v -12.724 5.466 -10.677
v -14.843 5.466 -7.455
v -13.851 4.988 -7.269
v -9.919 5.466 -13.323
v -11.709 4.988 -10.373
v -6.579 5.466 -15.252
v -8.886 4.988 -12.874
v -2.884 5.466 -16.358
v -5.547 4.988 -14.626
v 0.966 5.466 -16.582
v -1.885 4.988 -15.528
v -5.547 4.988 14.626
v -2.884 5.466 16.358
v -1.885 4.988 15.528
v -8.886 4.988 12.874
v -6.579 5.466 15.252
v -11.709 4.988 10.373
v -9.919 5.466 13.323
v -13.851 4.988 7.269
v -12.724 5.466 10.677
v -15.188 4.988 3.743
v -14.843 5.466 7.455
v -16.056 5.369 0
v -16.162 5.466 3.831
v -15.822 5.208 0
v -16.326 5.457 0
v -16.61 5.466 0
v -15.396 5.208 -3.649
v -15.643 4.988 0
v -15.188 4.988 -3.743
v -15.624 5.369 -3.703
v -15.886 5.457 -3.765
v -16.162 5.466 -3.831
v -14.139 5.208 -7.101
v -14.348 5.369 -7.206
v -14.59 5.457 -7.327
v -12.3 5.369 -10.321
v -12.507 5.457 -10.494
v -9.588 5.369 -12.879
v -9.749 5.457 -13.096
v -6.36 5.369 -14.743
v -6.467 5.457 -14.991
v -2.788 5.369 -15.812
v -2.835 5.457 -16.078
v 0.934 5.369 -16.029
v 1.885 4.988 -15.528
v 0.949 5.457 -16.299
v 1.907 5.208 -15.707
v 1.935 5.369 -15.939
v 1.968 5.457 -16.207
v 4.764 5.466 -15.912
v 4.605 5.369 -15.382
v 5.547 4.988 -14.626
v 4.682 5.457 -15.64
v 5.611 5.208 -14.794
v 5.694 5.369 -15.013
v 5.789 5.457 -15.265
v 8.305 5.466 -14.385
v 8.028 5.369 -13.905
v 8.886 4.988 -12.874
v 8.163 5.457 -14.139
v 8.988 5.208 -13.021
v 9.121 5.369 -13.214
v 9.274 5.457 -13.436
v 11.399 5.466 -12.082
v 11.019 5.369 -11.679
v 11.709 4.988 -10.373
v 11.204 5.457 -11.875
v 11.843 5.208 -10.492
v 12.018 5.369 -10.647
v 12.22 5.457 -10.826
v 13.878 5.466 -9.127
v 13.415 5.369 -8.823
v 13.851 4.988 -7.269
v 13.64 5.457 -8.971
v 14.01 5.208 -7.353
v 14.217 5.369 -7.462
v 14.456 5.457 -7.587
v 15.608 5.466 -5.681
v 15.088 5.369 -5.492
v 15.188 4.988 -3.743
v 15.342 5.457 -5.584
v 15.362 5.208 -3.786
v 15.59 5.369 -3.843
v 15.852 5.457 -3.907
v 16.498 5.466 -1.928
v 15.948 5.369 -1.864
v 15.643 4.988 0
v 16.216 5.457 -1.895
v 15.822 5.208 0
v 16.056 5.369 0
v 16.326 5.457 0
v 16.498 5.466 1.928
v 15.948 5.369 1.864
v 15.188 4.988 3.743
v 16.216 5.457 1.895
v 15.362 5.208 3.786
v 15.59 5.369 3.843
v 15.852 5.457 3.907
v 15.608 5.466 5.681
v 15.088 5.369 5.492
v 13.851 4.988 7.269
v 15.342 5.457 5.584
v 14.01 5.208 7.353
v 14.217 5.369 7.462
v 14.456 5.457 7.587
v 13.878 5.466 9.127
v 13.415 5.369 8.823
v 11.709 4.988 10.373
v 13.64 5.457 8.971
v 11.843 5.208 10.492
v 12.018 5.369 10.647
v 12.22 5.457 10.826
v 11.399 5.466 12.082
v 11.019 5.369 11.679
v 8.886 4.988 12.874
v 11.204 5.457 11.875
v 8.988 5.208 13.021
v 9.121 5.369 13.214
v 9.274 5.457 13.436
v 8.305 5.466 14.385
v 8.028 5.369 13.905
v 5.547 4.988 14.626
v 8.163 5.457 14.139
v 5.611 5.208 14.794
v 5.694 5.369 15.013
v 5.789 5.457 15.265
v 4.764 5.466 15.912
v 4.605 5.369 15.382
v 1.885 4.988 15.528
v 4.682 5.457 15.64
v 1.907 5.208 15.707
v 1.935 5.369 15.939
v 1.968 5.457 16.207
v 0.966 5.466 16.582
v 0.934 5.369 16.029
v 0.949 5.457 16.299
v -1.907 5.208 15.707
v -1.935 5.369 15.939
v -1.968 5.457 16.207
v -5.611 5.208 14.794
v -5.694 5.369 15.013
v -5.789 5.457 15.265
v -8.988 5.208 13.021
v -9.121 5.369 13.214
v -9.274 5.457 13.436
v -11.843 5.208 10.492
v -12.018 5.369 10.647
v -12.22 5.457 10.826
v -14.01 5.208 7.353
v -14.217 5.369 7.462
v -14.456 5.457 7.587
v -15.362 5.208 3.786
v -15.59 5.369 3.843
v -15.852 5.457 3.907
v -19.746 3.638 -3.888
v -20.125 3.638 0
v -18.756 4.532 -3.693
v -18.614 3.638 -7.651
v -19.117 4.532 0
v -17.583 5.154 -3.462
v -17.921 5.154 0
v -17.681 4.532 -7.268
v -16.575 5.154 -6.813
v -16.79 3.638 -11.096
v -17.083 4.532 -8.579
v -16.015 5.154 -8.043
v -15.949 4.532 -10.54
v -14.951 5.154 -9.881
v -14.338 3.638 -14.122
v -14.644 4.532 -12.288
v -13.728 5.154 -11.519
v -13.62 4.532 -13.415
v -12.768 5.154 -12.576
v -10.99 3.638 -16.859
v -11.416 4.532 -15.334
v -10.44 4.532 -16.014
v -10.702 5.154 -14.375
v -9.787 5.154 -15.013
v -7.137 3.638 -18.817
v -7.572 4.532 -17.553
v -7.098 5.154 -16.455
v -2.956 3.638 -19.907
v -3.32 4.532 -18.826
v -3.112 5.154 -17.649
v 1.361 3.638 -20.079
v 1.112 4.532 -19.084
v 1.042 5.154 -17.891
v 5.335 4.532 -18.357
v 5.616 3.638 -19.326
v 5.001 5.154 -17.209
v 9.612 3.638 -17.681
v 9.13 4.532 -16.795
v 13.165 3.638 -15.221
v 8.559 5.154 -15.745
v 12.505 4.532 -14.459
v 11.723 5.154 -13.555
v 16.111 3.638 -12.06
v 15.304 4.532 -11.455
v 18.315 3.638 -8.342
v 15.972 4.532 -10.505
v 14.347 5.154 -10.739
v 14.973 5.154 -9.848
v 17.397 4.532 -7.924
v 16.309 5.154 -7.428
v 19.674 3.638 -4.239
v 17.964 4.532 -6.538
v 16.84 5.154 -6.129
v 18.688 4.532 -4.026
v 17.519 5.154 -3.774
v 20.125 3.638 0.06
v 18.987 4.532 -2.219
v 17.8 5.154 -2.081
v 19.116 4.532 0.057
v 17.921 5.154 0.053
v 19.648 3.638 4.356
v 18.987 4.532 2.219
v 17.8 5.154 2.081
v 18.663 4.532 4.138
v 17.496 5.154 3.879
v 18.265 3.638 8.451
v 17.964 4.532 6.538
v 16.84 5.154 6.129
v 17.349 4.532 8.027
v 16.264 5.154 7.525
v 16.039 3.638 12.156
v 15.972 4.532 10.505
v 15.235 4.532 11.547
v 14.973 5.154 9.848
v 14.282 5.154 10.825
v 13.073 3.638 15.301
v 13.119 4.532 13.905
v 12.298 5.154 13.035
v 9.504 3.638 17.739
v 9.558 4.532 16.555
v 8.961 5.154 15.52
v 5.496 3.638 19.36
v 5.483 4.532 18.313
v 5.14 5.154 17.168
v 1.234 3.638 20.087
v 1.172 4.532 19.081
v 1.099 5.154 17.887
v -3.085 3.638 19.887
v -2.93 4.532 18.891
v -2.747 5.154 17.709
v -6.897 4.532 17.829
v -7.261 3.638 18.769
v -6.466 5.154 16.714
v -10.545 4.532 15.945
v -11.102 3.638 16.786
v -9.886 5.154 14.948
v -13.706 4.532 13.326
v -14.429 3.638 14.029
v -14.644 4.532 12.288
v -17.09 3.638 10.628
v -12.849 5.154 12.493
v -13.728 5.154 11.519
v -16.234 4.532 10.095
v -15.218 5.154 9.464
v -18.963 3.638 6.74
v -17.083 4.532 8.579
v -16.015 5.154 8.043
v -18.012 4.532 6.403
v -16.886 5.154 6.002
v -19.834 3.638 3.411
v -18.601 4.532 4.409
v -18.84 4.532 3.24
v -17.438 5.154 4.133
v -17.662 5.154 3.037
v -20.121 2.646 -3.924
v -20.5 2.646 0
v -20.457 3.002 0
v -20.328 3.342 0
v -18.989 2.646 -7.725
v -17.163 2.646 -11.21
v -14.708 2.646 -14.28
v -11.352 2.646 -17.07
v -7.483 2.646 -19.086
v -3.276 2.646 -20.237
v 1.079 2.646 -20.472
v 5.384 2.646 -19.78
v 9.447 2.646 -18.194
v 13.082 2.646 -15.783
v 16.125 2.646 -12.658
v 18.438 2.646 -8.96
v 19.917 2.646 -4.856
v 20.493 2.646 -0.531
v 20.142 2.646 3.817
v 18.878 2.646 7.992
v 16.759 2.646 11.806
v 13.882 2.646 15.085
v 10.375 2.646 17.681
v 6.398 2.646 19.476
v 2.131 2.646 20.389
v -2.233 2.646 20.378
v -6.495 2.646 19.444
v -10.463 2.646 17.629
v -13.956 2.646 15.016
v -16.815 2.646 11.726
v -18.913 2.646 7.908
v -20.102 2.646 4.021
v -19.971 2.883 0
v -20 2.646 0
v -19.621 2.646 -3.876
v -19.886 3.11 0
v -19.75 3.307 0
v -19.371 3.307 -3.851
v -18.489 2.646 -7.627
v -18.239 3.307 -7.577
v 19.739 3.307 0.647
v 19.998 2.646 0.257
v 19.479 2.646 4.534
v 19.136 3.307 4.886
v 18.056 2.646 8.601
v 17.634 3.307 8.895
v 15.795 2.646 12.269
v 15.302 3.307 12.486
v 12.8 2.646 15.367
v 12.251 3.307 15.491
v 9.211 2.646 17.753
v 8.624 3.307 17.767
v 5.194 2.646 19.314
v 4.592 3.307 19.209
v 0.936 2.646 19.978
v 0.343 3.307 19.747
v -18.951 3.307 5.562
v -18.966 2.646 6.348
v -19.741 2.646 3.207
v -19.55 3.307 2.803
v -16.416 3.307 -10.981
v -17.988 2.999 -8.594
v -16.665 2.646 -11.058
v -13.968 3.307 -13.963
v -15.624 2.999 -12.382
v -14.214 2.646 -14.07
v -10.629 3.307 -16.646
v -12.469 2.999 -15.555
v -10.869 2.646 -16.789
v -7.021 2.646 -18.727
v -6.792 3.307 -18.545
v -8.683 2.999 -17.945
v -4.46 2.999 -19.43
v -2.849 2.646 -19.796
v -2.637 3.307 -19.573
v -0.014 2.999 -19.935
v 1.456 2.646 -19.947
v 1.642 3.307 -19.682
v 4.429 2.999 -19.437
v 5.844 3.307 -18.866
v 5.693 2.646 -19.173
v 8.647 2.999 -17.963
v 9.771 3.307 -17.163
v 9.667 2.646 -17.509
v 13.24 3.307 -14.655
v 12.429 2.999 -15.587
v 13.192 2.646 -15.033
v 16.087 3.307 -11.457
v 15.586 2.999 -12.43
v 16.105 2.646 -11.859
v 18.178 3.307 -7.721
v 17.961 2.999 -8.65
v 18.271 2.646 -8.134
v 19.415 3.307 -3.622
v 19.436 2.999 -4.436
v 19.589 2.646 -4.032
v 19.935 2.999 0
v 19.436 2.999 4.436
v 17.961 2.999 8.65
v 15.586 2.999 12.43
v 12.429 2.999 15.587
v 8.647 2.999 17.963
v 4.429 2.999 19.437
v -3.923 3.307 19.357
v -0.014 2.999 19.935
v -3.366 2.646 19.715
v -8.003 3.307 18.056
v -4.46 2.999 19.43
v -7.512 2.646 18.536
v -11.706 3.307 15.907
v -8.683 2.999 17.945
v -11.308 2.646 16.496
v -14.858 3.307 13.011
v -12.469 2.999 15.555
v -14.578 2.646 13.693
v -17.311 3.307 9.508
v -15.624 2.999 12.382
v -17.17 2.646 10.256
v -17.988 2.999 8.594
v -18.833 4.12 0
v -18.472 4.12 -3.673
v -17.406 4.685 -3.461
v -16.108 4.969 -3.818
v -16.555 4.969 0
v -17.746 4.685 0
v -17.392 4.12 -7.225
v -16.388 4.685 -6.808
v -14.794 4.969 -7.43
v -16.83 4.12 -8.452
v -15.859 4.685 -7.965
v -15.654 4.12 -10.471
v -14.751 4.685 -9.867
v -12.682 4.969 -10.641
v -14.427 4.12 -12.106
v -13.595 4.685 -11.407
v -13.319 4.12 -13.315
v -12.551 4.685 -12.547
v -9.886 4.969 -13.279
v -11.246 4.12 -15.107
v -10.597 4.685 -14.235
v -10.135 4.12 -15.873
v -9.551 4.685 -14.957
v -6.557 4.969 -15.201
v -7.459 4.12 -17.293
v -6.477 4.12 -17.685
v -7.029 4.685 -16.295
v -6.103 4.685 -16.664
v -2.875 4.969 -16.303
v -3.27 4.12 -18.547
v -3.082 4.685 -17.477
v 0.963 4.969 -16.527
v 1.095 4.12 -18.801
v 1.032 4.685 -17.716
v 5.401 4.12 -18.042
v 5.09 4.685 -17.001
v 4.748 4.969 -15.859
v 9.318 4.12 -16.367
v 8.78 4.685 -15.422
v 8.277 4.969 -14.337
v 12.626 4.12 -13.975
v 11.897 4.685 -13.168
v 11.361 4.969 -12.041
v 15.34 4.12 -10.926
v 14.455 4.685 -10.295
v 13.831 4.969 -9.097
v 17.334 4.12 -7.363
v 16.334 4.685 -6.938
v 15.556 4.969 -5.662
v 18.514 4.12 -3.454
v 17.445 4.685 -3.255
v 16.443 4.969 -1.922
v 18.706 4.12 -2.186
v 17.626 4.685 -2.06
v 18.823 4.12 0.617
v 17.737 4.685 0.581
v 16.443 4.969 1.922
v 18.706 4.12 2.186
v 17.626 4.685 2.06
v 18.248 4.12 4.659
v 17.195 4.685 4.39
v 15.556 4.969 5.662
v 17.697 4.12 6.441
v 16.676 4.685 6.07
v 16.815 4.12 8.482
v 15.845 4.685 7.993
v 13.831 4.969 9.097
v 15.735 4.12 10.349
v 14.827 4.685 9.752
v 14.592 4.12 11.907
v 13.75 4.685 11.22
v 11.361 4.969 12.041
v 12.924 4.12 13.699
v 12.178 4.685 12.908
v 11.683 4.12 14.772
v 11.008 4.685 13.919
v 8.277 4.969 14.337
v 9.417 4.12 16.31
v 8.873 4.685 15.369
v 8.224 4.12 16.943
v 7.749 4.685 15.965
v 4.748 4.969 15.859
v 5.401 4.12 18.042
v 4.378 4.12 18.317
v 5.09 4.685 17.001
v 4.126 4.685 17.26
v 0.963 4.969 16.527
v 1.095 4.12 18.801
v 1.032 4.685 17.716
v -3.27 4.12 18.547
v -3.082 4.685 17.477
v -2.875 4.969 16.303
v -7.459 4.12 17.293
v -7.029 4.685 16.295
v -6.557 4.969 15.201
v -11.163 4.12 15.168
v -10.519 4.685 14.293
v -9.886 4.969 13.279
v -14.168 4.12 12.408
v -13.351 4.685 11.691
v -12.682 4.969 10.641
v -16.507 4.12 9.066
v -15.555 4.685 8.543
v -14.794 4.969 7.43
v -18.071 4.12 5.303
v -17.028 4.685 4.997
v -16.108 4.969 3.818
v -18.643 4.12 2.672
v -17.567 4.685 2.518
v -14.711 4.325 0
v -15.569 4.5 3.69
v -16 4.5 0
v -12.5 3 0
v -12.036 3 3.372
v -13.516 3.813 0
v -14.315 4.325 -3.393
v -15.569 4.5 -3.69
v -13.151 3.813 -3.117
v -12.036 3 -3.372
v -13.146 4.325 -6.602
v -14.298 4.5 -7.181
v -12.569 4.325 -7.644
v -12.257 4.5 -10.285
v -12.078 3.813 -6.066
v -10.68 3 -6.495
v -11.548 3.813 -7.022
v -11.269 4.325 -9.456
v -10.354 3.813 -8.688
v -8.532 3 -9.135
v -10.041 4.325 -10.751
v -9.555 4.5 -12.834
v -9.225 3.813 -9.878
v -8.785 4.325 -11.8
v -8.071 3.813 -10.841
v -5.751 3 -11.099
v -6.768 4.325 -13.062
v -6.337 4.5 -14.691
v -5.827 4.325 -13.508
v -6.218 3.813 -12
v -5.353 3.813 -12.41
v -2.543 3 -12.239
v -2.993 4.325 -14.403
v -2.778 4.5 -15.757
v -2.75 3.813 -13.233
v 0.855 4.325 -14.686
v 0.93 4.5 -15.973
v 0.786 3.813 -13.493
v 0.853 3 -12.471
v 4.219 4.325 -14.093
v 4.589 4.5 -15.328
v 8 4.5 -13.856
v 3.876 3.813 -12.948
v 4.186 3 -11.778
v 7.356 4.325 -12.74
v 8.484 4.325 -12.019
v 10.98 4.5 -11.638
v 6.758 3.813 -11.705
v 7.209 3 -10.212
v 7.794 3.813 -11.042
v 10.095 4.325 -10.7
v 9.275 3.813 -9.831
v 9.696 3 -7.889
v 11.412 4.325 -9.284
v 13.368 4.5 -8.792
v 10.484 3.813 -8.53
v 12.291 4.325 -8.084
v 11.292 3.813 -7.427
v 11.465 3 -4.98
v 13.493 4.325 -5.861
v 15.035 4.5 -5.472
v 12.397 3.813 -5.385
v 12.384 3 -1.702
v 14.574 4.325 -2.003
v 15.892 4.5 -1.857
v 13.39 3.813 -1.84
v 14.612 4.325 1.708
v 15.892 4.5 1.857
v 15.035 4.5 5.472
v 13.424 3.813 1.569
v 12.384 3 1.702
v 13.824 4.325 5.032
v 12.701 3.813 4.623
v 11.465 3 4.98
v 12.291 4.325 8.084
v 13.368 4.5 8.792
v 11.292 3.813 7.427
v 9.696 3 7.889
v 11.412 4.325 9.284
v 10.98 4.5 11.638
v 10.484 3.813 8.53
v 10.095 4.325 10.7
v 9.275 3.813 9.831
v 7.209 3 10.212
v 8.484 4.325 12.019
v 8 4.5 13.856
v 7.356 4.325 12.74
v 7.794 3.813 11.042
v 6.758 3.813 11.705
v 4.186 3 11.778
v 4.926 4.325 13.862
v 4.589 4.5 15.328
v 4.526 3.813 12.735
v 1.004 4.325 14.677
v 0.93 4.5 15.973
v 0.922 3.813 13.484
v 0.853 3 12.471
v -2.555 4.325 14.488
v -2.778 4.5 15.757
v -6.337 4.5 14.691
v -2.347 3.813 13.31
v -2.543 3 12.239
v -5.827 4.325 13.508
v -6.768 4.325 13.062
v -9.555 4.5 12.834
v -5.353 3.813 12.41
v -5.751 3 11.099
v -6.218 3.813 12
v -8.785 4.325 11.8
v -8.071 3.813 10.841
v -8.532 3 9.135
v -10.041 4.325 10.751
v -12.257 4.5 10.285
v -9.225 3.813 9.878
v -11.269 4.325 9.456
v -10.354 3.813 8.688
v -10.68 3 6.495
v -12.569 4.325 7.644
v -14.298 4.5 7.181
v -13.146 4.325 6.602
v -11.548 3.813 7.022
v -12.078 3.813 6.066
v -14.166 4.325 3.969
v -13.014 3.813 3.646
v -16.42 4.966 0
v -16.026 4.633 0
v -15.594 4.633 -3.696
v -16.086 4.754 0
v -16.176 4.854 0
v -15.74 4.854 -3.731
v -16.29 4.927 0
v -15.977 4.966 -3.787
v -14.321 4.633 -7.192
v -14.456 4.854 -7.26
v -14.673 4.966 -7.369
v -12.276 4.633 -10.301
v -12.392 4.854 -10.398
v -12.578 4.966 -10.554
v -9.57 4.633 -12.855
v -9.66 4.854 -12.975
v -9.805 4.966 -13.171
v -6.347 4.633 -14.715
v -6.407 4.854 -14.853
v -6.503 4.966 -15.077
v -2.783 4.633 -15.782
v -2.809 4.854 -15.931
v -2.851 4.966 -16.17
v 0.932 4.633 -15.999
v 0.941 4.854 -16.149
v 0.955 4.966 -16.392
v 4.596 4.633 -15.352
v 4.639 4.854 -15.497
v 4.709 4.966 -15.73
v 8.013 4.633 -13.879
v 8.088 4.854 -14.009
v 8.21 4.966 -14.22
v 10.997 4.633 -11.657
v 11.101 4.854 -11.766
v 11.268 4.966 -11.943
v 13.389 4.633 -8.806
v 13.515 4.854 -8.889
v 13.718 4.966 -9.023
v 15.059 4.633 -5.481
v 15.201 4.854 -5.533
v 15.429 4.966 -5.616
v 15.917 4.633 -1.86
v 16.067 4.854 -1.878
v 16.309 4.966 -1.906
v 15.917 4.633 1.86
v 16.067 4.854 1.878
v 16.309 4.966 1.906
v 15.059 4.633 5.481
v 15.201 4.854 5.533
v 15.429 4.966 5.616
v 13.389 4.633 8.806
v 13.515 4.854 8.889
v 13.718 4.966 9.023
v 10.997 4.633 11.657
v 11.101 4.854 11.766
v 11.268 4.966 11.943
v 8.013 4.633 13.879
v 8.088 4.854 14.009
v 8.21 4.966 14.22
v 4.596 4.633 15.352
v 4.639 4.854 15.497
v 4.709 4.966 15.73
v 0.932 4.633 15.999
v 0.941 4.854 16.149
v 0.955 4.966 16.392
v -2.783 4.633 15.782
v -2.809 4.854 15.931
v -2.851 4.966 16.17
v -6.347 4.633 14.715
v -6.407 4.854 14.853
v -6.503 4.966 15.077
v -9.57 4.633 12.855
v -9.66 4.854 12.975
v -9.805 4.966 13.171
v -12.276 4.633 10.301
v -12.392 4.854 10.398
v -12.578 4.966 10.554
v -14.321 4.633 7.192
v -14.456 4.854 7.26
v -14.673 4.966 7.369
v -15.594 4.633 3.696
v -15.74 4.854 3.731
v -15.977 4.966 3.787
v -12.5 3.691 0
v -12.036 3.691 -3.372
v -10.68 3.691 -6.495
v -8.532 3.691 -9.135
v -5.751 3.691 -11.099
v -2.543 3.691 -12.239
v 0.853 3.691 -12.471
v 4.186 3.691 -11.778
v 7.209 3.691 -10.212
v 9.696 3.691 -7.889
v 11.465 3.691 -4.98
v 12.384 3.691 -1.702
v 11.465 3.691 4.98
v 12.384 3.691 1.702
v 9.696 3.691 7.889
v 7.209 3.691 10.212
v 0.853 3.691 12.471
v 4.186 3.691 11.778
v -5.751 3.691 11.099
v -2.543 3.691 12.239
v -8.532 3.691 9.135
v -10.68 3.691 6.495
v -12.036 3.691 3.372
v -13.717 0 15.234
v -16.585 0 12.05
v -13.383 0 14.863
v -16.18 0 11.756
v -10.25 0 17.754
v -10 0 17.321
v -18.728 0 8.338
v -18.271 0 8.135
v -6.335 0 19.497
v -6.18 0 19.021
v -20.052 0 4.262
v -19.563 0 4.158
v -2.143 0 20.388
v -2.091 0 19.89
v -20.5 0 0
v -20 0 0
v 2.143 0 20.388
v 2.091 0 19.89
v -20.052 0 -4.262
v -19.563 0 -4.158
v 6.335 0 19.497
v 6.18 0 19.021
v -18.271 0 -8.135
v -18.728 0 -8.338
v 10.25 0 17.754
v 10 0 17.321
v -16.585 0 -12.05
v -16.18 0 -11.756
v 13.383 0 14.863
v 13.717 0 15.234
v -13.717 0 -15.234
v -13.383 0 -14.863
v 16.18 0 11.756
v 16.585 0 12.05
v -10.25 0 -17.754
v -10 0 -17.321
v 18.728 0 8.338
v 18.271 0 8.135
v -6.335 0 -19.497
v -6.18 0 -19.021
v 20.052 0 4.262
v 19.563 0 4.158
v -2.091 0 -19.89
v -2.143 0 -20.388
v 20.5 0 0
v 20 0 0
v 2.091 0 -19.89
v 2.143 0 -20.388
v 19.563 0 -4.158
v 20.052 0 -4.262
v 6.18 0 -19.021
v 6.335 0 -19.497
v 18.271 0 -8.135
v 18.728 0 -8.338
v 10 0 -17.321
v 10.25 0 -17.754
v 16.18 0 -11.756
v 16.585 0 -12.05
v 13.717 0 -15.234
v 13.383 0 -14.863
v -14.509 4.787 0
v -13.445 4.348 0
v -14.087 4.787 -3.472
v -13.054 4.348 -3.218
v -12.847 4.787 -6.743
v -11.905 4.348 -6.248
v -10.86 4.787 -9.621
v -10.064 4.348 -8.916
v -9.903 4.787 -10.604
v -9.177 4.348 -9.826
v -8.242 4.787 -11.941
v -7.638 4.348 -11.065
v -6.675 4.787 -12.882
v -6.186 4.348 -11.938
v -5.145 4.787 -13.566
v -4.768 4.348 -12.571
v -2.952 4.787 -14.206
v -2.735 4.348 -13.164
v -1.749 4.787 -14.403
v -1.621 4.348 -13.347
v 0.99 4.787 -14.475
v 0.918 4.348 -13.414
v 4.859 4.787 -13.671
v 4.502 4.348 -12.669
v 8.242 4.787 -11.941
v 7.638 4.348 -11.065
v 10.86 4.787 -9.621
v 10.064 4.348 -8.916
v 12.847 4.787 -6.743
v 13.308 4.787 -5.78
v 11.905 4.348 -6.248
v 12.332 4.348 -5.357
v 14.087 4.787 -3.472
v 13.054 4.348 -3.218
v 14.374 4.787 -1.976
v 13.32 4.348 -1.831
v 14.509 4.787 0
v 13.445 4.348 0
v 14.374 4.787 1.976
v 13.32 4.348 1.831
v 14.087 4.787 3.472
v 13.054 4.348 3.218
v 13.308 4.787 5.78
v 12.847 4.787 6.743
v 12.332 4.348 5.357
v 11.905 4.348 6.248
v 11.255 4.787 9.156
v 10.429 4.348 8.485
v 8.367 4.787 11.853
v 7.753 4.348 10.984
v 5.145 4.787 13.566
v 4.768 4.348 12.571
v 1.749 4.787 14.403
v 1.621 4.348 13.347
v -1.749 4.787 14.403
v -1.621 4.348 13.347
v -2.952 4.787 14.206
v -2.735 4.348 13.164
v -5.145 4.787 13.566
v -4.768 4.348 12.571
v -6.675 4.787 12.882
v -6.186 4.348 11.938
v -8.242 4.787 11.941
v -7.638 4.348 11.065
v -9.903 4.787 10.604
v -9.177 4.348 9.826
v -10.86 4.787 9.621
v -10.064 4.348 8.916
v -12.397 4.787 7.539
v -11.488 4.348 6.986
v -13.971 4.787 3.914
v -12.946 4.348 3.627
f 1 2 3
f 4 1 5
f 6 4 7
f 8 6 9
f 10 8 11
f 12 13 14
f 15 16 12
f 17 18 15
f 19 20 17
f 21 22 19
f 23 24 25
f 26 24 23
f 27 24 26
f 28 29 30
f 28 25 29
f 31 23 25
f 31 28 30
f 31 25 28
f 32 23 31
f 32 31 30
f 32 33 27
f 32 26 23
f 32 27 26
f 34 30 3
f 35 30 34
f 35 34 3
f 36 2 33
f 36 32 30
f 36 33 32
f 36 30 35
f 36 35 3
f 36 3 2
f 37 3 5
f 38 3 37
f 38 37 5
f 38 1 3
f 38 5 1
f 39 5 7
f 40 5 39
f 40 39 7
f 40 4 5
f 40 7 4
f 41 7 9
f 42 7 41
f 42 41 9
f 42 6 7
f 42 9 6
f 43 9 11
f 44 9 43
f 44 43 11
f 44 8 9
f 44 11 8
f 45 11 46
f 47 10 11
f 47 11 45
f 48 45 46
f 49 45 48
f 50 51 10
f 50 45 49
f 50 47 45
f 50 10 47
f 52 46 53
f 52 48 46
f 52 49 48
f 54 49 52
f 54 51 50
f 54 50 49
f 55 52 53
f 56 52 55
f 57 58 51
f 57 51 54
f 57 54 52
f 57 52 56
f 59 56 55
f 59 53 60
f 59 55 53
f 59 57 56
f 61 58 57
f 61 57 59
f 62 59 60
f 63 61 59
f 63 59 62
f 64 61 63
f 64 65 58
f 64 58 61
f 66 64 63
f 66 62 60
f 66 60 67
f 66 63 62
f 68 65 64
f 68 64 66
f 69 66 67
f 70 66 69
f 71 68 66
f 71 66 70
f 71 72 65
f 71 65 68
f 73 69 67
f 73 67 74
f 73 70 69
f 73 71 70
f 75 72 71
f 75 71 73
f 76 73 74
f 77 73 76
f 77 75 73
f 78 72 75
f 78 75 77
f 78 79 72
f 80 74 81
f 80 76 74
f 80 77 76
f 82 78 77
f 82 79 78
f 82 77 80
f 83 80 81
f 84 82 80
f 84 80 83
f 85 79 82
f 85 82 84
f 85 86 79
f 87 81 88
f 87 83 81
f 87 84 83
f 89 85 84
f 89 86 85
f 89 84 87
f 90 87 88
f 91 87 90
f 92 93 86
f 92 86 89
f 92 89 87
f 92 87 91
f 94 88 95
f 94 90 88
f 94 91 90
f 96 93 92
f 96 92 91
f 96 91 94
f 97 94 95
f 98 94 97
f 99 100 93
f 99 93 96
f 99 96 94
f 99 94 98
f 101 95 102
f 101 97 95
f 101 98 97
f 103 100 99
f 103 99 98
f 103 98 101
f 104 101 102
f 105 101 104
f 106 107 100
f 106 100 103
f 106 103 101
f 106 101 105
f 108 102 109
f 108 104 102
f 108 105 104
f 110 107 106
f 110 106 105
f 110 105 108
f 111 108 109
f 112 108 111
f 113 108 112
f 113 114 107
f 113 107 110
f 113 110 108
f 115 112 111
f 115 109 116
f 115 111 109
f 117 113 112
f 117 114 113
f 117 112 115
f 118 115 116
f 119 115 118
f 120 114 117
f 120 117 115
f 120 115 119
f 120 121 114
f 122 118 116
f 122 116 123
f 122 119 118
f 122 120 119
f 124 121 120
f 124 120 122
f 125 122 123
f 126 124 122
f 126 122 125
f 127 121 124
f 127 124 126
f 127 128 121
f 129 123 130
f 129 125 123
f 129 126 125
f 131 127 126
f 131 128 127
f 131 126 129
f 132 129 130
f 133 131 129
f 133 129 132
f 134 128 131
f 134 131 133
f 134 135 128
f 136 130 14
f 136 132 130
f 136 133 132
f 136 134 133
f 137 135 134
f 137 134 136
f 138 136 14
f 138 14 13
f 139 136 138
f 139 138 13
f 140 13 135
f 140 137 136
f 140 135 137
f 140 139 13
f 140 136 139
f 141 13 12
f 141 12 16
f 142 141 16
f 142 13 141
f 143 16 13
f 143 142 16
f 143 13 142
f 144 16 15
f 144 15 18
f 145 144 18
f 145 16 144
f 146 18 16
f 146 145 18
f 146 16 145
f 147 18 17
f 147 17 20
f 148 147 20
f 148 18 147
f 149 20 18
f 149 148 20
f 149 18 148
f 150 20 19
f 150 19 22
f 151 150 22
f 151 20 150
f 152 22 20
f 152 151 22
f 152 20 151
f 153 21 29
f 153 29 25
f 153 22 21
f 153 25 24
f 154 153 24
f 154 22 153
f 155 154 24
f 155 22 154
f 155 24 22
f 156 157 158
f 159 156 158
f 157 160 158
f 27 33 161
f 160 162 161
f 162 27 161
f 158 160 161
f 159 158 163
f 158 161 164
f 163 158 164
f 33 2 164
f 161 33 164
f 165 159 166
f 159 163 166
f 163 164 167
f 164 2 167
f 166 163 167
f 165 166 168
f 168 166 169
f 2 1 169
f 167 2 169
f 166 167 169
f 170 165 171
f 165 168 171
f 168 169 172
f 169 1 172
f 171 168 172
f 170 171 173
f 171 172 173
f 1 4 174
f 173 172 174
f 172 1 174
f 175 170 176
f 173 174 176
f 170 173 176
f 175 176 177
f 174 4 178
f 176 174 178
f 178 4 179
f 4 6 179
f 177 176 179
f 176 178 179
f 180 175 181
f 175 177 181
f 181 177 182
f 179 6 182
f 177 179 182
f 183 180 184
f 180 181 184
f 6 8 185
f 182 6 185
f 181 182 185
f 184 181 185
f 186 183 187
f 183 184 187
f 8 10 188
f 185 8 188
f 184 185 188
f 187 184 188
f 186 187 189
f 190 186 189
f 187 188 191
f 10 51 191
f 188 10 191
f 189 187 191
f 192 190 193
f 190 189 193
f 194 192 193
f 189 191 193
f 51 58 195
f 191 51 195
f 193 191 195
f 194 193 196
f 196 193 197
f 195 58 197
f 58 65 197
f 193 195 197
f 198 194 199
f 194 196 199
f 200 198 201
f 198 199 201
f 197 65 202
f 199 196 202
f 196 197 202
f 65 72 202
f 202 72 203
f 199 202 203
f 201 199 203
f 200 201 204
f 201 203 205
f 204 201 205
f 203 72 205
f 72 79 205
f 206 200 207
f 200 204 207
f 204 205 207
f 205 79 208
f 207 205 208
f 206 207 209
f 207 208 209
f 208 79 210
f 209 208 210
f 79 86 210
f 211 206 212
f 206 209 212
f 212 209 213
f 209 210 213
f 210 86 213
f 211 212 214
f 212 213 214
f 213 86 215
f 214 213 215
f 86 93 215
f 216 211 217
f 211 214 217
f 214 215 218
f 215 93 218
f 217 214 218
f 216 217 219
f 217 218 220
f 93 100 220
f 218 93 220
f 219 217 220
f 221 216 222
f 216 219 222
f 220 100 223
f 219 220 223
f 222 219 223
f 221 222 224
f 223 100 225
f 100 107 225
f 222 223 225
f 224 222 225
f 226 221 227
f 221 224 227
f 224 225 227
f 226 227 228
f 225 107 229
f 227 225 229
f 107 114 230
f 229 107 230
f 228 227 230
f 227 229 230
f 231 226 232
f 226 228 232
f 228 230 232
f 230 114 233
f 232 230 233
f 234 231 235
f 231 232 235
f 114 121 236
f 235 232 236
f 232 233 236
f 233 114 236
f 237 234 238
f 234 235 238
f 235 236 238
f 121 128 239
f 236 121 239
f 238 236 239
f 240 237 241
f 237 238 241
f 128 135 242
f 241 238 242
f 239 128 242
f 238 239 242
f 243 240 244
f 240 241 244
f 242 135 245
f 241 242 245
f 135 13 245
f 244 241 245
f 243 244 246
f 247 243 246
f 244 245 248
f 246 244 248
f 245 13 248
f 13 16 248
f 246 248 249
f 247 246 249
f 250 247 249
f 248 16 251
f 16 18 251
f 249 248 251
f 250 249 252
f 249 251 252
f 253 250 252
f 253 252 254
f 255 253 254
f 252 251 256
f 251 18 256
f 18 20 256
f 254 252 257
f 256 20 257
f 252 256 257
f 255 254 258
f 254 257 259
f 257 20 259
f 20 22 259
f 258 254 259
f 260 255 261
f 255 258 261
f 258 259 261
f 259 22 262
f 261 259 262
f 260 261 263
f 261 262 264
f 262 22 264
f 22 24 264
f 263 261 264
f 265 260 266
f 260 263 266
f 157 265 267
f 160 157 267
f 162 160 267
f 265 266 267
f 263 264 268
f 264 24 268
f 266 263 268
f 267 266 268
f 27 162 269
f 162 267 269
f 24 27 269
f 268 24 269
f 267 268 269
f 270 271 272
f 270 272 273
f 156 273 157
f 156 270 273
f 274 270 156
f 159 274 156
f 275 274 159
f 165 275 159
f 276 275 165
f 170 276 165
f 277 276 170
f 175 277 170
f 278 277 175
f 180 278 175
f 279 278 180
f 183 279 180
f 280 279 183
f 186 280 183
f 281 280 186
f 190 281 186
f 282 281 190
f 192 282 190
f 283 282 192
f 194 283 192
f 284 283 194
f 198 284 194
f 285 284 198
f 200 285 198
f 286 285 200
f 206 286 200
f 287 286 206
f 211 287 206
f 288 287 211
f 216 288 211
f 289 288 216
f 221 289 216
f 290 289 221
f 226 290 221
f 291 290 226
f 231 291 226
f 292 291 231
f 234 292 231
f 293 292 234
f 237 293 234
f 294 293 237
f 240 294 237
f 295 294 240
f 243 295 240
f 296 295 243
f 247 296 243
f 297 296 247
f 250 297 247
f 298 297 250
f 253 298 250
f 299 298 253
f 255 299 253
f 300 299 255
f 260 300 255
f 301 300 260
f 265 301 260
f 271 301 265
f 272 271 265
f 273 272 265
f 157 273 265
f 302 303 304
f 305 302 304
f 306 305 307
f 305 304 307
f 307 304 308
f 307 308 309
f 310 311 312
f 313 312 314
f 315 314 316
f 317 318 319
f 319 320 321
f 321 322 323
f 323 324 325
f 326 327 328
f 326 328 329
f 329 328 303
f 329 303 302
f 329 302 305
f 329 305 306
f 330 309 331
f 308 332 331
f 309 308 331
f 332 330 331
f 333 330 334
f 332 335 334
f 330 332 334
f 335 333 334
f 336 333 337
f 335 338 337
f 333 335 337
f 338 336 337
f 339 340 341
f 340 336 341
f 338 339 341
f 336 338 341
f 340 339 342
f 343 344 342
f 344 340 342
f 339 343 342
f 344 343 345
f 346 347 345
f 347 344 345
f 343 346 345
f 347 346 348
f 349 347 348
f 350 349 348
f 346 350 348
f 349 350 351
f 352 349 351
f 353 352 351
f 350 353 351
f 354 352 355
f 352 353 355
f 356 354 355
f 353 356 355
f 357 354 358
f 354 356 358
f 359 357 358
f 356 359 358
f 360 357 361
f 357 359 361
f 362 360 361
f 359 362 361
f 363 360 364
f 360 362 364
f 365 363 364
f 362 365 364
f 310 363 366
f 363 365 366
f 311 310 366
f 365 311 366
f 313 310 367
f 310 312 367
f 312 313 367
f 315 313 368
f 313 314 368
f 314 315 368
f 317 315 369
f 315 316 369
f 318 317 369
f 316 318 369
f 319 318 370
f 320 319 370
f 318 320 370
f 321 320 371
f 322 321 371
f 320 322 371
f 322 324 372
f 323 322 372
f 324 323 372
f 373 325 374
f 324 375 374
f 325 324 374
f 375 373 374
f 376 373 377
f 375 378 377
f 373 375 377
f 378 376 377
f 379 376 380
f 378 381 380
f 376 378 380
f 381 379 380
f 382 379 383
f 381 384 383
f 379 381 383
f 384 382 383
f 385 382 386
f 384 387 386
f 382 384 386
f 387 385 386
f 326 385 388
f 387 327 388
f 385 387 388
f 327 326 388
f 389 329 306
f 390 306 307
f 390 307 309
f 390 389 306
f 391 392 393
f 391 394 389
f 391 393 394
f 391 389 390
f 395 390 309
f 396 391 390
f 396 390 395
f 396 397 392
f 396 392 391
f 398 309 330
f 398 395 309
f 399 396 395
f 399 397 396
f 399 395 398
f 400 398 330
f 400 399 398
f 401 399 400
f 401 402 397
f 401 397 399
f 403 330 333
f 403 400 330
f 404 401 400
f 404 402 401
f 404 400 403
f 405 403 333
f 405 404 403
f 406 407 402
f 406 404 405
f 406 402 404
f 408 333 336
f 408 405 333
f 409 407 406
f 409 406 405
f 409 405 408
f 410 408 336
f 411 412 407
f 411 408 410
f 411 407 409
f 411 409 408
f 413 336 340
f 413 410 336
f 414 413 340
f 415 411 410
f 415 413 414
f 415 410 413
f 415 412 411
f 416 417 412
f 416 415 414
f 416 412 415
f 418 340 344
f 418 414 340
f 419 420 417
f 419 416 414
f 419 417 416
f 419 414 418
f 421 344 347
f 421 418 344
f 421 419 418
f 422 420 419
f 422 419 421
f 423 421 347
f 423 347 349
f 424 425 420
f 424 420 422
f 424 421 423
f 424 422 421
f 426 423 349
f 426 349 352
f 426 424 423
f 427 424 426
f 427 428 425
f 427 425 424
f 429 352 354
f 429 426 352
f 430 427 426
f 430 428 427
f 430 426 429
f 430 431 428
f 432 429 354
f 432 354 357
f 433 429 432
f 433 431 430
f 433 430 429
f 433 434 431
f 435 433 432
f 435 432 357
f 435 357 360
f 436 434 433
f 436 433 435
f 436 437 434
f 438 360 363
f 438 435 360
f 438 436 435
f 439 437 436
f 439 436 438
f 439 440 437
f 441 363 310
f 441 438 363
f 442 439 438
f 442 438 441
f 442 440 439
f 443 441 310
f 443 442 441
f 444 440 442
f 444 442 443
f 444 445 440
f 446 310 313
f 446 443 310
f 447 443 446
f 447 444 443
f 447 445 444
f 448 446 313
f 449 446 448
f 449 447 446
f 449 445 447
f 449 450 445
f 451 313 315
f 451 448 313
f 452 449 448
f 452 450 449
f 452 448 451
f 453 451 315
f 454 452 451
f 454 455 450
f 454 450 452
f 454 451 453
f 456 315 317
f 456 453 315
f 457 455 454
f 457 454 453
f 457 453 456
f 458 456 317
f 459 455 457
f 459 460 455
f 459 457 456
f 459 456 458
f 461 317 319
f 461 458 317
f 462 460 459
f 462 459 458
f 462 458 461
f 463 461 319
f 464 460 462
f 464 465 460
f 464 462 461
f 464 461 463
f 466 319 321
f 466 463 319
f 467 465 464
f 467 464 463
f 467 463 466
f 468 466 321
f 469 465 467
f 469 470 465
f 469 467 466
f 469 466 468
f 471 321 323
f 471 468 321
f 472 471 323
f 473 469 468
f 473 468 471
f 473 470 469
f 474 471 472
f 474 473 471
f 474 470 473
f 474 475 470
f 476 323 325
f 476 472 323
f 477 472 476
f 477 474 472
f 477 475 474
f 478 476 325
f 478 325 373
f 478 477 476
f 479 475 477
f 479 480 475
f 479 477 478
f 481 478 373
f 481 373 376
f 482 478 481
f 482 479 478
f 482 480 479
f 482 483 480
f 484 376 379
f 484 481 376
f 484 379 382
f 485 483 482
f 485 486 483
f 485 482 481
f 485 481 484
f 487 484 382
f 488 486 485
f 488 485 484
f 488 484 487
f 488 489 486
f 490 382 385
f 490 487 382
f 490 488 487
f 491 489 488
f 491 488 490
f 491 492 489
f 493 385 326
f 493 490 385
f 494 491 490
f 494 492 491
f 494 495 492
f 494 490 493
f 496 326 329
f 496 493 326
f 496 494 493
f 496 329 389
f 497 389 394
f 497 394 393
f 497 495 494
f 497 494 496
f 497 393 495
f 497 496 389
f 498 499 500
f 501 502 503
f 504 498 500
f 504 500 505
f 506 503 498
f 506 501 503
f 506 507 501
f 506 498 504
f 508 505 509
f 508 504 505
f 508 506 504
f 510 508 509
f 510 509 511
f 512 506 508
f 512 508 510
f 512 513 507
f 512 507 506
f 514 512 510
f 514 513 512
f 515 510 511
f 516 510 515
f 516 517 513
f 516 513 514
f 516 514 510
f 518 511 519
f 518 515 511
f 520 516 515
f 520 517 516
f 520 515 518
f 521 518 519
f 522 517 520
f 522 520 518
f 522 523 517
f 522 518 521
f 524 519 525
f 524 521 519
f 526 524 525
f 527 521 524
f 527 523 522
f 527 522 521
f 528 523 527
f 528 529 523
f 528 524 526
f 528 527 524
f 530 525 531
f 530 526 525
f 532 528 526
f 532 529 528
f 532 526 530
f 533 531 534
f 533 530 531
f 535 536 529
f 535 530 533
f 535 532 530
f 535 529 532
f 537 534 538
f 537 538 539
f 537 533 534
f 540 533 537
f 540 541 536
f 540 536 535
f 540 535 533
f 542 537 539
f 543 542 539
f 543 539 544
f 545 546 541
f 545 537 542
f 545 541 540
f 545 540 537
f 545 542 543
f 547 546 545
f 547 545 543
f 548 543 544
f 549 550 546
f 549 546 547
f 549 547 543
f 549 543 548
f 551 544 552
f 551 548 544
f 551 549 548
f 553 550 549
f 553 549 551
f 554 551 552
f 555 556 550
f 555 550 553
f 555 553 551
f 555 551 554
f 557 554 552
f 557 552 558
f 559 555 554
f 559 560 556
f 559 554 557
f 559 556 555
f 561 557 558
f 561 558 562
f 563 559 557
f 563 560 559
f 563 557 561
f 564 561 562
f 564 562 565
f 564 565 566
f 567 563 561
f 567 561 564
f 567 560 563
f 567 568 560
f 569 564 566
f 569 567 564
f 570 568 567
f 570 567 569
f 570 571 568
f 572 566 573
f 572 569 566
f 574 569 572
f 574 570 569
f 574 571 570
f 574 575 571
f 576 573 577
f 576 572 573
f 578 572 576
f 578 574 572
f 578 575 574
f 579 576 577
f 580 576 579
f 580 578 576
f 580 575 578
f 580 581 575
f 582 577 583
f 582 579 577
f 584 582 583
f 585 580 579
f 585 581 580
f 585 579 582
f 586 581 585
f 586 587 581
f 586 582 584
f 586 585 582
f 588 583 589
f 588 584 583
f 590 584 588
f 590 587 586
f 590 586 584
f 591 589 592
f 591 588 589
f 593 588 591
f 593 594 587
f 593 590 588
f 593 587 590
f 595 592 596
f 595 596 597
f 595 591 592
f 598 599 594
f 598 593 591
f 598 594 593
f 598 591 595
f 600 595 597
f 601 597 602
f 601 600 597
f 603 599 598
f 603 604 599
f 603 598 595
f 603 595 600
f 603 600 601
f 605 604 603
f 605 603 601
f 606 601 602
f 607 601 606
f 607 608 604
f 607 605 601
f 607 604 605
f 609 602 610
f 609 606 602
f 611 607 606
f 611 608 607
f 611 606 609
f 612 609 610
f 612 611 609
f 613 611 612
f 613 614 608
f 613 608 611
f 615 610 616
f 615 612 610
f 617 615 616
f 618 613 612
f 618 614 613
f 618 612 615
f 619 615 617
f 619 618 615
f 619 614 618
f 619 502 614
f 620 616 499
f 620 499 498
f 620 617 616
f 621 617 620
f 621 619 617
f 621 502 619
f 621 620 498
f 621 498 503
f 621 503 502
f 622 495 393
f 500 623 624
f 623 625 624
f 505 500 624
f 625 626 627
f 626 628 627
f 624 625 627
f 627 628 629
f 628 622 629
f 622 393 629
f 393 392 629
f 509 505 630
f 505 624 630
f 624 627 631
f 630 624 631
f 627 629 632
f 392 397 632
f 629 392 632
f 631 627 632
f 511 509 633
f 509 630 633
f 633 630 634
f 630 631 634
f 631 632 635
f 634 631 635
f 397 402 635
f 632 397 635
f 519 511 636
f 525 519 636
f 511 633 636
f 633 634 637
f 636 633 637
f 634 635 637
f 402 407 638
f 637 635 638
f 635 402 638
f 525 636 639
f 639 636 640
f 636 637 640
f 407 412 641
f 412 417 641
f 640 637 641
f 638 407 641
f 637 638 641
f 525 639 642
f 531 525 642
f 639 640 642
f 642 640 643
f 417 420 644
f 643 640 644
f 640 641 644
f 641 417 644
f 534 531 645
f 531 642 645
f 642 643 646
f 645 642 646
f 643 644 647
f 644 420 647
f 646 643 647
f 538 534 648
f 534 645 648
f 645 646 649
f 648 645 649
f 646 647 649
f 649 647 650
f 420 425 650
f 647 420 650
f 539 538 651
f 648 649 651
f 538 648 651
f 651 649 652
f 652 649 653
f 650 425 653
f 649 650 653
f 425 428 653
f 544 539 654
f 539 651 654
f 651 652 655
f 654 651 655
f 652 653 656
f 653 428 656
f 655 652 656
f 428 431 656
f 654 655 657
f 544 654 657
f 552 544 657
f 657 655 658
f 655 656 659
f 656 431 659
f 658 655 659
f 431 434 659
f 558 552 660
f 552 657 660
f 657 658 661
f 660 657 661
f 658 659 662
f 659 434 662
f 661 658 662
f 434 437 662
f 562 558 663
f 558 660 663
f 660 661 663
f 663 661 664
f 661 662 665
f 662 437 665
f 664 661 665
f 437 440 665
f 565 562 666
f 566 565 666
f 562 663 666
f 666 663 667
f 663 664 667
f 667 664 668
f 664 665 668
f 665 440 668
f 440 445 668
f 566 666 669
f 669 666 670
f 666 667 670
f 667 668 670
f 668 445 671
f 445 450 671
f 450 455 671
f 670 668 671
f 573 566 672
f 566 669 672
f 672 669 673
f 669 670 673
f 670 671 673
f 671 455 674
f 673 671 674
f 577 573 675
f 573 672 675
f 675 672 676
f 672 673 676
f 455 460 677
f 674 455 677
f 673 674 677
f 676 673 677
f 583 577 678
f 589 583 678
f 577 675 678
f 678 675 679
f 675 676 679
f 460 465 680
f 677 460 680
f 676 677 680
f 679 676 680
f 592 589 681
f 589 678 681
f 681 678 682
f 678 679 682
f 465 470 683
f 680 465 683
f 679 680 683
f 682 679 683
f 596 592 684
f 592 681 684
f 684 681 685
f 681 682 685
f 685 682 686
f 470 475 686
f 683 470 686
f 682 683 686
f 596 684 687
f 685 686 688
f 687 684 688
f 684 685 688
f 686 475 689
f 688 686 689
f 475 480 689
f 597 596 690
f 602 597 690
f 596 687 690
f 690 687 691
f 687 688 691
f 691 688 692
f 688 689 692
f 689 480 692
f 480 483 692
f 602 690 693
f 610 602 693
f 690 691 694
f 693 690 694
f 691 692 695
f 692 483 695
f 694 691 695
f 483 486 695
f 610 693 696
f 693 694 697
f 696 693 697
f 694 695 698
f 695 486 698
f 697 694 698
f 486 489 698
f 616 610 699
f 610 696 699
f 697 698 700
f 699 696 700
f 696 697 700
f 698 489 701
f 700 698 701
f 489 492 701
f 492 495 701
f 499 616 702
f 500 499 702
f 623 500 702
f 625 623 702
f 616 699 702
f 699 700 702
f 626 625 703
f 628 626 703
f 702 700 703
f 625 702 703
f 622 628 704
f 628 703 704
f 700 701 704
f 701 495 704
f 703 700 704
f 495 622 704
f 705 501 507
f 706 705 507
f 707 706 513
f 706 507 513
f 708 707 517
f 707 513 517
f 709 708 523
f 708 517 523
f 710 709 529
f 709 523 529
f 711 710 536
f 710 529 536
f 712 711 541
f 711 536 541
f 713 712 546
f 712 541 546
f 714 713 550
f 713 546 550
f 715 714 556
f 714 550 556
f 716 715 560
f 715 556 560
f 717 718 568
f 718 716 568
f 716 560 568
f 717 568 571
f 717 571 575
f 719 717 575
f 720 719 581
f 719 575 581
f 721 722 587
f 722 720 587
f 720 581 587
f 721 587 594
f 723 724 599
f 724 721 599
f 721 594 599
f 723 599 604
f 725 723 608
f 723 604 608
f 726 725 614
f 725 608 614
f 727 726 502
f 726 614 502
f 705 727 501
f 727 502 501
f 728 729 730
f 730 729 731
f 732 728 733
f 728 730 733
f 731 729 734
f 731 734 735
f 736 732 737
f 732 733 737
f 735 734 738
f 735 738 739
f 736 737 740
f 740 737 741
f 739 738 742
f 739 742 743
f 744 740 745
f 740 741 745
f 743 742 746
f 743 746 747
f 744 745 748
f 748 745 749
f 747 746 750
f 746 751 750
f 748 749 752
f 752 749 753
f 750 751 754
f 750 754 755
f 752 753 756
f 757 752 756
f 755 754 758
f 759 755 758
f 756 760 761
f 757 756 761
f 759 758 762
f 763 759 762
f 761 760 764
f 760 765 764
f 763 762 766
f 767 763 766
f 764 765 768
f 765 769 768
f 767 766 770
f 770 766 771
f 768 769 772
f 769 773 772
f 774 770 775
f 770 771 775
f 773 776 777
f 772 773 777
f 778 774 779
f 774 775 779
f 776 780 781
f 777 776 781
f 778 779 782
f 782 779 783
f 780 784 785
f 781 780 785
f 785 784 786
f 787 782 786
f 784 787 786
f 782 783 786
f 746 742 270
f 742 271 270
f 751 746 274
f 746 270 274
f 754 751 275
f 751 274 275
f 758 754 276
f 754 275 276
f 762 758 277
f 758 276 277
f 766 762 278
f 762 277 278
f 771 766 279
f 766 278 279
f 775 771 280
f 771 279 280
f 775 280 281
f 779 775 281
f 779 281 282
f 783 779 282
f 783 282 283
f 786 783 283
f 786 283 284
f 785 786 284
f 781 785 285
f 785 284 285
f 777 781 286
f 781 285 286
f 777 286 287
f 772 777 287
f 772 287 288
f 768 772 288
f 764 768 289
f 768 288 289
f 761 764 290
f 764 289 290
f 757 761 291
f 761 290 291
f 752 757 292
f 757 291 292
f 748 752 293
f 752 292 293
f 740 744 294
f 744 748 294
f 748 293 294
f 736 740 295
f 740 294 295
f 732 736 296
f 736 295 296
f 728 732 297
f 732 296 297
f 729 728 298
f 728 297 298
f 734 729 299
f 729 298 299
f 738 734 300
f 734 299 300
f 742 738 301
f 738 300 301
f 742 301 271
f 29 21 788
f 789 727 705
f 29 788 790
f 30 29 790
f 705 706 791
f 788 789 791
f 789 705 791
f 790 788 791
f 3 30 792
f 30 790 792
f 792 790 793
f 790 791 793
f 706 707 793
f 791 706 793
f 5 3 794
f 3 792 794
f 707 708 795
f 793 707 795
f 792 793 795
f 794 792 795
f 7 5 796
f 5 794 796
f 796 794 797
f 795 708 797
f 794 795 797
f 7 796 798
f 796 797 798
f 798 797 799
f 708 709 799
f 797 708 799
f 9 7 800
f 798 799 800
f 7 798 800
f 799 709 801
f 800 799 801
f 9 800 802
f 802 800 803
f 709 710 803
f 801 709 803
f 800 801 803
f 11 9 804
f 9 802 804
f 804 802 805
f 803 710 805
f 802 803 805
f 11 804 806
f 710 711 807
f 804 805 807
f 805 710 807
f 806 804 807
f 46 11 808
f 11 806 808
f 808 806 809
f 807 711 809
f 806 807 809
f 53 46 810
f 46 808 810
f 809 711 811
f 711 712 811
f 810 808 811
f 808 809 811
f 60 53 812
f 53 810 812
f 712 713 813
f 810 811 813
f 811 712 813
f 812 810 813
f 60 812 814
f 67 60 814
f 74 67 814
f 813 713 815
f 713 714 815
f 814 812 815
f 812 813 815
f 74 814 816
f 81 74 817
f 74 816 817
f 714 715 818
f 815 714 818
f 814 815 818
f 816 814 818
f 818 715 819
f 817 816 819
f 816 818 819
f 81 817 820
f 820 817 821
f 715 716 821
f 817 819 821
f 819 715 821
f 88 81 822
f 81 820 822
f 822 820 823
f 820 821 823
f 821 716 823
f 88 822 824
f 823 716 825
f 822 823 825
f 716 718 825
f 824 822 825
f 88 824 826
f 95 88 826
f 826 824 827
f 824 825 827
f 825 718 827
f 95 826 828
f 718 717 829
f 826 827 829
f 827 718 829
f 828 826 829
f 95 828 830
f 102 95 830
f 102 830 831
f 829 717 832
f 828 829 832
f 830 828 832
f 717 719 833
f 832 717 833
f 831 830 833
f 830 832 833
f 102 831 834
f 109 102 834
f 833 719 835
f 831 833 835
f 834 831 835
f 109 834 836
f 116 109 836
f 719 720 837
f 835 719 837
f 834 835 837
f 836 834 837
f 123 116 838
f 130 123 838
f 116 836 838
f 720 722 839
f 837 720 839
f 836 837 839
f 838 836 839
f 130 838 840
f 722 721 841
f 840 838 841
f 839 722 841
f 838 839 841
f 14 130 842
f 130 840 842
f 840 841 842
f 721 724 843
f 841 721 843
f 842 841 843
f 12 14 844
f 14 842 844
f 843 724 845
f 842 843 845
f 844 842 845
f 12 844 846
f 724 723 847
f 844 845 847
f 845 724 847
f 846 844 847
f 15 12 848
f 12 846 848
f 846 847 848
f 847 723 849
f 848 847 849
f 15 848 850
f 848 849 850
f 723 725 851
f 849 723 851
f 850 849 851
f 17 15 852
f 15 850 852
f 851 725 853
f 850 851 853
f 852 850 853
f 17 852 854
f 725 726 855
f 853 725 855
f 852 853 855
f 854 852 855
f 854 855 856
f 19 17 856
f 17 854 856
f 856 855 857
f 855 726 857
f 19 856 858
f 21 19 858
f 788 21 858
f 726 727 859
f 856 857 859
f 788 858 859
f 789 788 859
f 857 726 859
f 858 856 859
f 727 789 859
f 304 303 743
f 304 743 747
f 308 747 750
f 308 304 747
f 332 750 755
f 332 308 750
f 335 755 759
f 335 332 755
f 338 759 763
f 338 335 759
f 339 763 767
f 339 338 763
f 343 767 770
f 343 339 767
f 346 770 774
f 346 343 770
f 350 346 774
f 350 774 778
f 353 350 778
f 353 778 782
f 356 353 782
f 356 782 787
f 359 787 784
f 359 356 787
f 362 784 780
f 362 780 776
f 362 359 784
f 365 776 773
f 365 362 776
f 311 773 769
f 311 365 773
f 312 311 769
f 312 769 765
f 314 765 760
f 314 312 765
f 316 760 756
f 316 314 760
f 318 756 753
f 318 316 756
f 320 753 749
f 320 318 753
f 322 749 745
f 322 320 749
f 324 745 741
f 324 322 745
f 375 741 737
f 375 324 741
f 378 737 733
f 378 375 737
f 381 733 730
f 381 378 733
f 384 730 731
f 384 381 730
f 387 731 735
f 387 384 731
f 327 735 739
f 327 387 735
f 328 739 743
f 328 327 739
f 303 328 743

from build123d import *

# Parameters (mm, degrees)
FILLET_1_R = 1
FILLET_2_R = 0.5
SHELL_1_T  = 0.5


with BuildPart() as part:
    # Эскиз1 → Повернуть1 (revolve)
    with BuildSketch(Plane.XY):
        with BuildLine():
            Line((-20, -2.45e-15), (-20, 2.9999999999999973))
            ThreePointArc((-20, 2.9999999999999973), (-18.23606797749979, 4.47213595499958), (-16, 5.000000000000001))
            Line((-16, 5.000000000000001), (-16, 4.500000000000001))
            ThreePointArc((-16, 4.500000000000001), (-14.096056723534023, 4.1092009784206125), (-12.5, 2.9999999999999973))
            Line((-12.5, 2.9999999999999973), (-12.5, -1.53e-15))
            Line((-12.5, -1.53e-15), (-20, -2.45e-15))
        make_face()
    revolve(axis=Axis((8.7e-16, 5, 0), (-1.7e-16, -1, 0)))

    # Скругление1
    fillet_1_edges = [part.edges().sort_by_distance(p)[0] for p in [
        (20, 2.99999999999999, -2.45e-15),
    ]]
    fillet(fillet_1_edges, radius=FILLET_1_R)

    # Скругление2
    # the kernel refuses this fillet: 0.5 mm, written as the material it takes off along each edge
    with BuildSketch(Plane(origin=(8.7e-16, 4.999999999999999, 0), x_dir=(-1, 1.7e-16, 0), z_dir=(0, 0, 1))) as fillet_2_piece_1:
        with BuildLine():
            CenterArc((16.499227798766984, 0.5277777777777778), FILLET_2_R, 183.1847385367202, 93.18473853672054)
            Line((16, 0.5000000000000018), (15.99001544402466, 0.49944444444444613))
            ThreePointArc((15.99001544402466, 0.49944444444444613), (15.99, 0.2500000000000009), (15.99, 0))
            Line((15.99, 0), (16, -0.00999999999999979))
            ThreePointArc((16, -0.00999999999999979), (16.278333333333332, -0.00226254364518126), (16.55580694929391, 0.02092592592592544))
            Line((16.55580694929391, 0.02092592592592544), (16.554697554185537, 0.03086419753086398))
        make_face()
    revolve(axis=Axis((8.7e-16, 4.999999999999999, 0), (-1.7e-16, -1, 0)), mode=Mode.SUBTRACT)

    # Оболочка1
    shell_1_openings = [part.faces().sort_by_distance(p)[0] for p in [
        (13.065685425, 0, 0),
        (12.5, 1.5, 0),
    ]]
    offset(amount=SHELL_1_T, openings=shell_1_openings, kind=Kind.INTERSECTION)


solid = part.part
